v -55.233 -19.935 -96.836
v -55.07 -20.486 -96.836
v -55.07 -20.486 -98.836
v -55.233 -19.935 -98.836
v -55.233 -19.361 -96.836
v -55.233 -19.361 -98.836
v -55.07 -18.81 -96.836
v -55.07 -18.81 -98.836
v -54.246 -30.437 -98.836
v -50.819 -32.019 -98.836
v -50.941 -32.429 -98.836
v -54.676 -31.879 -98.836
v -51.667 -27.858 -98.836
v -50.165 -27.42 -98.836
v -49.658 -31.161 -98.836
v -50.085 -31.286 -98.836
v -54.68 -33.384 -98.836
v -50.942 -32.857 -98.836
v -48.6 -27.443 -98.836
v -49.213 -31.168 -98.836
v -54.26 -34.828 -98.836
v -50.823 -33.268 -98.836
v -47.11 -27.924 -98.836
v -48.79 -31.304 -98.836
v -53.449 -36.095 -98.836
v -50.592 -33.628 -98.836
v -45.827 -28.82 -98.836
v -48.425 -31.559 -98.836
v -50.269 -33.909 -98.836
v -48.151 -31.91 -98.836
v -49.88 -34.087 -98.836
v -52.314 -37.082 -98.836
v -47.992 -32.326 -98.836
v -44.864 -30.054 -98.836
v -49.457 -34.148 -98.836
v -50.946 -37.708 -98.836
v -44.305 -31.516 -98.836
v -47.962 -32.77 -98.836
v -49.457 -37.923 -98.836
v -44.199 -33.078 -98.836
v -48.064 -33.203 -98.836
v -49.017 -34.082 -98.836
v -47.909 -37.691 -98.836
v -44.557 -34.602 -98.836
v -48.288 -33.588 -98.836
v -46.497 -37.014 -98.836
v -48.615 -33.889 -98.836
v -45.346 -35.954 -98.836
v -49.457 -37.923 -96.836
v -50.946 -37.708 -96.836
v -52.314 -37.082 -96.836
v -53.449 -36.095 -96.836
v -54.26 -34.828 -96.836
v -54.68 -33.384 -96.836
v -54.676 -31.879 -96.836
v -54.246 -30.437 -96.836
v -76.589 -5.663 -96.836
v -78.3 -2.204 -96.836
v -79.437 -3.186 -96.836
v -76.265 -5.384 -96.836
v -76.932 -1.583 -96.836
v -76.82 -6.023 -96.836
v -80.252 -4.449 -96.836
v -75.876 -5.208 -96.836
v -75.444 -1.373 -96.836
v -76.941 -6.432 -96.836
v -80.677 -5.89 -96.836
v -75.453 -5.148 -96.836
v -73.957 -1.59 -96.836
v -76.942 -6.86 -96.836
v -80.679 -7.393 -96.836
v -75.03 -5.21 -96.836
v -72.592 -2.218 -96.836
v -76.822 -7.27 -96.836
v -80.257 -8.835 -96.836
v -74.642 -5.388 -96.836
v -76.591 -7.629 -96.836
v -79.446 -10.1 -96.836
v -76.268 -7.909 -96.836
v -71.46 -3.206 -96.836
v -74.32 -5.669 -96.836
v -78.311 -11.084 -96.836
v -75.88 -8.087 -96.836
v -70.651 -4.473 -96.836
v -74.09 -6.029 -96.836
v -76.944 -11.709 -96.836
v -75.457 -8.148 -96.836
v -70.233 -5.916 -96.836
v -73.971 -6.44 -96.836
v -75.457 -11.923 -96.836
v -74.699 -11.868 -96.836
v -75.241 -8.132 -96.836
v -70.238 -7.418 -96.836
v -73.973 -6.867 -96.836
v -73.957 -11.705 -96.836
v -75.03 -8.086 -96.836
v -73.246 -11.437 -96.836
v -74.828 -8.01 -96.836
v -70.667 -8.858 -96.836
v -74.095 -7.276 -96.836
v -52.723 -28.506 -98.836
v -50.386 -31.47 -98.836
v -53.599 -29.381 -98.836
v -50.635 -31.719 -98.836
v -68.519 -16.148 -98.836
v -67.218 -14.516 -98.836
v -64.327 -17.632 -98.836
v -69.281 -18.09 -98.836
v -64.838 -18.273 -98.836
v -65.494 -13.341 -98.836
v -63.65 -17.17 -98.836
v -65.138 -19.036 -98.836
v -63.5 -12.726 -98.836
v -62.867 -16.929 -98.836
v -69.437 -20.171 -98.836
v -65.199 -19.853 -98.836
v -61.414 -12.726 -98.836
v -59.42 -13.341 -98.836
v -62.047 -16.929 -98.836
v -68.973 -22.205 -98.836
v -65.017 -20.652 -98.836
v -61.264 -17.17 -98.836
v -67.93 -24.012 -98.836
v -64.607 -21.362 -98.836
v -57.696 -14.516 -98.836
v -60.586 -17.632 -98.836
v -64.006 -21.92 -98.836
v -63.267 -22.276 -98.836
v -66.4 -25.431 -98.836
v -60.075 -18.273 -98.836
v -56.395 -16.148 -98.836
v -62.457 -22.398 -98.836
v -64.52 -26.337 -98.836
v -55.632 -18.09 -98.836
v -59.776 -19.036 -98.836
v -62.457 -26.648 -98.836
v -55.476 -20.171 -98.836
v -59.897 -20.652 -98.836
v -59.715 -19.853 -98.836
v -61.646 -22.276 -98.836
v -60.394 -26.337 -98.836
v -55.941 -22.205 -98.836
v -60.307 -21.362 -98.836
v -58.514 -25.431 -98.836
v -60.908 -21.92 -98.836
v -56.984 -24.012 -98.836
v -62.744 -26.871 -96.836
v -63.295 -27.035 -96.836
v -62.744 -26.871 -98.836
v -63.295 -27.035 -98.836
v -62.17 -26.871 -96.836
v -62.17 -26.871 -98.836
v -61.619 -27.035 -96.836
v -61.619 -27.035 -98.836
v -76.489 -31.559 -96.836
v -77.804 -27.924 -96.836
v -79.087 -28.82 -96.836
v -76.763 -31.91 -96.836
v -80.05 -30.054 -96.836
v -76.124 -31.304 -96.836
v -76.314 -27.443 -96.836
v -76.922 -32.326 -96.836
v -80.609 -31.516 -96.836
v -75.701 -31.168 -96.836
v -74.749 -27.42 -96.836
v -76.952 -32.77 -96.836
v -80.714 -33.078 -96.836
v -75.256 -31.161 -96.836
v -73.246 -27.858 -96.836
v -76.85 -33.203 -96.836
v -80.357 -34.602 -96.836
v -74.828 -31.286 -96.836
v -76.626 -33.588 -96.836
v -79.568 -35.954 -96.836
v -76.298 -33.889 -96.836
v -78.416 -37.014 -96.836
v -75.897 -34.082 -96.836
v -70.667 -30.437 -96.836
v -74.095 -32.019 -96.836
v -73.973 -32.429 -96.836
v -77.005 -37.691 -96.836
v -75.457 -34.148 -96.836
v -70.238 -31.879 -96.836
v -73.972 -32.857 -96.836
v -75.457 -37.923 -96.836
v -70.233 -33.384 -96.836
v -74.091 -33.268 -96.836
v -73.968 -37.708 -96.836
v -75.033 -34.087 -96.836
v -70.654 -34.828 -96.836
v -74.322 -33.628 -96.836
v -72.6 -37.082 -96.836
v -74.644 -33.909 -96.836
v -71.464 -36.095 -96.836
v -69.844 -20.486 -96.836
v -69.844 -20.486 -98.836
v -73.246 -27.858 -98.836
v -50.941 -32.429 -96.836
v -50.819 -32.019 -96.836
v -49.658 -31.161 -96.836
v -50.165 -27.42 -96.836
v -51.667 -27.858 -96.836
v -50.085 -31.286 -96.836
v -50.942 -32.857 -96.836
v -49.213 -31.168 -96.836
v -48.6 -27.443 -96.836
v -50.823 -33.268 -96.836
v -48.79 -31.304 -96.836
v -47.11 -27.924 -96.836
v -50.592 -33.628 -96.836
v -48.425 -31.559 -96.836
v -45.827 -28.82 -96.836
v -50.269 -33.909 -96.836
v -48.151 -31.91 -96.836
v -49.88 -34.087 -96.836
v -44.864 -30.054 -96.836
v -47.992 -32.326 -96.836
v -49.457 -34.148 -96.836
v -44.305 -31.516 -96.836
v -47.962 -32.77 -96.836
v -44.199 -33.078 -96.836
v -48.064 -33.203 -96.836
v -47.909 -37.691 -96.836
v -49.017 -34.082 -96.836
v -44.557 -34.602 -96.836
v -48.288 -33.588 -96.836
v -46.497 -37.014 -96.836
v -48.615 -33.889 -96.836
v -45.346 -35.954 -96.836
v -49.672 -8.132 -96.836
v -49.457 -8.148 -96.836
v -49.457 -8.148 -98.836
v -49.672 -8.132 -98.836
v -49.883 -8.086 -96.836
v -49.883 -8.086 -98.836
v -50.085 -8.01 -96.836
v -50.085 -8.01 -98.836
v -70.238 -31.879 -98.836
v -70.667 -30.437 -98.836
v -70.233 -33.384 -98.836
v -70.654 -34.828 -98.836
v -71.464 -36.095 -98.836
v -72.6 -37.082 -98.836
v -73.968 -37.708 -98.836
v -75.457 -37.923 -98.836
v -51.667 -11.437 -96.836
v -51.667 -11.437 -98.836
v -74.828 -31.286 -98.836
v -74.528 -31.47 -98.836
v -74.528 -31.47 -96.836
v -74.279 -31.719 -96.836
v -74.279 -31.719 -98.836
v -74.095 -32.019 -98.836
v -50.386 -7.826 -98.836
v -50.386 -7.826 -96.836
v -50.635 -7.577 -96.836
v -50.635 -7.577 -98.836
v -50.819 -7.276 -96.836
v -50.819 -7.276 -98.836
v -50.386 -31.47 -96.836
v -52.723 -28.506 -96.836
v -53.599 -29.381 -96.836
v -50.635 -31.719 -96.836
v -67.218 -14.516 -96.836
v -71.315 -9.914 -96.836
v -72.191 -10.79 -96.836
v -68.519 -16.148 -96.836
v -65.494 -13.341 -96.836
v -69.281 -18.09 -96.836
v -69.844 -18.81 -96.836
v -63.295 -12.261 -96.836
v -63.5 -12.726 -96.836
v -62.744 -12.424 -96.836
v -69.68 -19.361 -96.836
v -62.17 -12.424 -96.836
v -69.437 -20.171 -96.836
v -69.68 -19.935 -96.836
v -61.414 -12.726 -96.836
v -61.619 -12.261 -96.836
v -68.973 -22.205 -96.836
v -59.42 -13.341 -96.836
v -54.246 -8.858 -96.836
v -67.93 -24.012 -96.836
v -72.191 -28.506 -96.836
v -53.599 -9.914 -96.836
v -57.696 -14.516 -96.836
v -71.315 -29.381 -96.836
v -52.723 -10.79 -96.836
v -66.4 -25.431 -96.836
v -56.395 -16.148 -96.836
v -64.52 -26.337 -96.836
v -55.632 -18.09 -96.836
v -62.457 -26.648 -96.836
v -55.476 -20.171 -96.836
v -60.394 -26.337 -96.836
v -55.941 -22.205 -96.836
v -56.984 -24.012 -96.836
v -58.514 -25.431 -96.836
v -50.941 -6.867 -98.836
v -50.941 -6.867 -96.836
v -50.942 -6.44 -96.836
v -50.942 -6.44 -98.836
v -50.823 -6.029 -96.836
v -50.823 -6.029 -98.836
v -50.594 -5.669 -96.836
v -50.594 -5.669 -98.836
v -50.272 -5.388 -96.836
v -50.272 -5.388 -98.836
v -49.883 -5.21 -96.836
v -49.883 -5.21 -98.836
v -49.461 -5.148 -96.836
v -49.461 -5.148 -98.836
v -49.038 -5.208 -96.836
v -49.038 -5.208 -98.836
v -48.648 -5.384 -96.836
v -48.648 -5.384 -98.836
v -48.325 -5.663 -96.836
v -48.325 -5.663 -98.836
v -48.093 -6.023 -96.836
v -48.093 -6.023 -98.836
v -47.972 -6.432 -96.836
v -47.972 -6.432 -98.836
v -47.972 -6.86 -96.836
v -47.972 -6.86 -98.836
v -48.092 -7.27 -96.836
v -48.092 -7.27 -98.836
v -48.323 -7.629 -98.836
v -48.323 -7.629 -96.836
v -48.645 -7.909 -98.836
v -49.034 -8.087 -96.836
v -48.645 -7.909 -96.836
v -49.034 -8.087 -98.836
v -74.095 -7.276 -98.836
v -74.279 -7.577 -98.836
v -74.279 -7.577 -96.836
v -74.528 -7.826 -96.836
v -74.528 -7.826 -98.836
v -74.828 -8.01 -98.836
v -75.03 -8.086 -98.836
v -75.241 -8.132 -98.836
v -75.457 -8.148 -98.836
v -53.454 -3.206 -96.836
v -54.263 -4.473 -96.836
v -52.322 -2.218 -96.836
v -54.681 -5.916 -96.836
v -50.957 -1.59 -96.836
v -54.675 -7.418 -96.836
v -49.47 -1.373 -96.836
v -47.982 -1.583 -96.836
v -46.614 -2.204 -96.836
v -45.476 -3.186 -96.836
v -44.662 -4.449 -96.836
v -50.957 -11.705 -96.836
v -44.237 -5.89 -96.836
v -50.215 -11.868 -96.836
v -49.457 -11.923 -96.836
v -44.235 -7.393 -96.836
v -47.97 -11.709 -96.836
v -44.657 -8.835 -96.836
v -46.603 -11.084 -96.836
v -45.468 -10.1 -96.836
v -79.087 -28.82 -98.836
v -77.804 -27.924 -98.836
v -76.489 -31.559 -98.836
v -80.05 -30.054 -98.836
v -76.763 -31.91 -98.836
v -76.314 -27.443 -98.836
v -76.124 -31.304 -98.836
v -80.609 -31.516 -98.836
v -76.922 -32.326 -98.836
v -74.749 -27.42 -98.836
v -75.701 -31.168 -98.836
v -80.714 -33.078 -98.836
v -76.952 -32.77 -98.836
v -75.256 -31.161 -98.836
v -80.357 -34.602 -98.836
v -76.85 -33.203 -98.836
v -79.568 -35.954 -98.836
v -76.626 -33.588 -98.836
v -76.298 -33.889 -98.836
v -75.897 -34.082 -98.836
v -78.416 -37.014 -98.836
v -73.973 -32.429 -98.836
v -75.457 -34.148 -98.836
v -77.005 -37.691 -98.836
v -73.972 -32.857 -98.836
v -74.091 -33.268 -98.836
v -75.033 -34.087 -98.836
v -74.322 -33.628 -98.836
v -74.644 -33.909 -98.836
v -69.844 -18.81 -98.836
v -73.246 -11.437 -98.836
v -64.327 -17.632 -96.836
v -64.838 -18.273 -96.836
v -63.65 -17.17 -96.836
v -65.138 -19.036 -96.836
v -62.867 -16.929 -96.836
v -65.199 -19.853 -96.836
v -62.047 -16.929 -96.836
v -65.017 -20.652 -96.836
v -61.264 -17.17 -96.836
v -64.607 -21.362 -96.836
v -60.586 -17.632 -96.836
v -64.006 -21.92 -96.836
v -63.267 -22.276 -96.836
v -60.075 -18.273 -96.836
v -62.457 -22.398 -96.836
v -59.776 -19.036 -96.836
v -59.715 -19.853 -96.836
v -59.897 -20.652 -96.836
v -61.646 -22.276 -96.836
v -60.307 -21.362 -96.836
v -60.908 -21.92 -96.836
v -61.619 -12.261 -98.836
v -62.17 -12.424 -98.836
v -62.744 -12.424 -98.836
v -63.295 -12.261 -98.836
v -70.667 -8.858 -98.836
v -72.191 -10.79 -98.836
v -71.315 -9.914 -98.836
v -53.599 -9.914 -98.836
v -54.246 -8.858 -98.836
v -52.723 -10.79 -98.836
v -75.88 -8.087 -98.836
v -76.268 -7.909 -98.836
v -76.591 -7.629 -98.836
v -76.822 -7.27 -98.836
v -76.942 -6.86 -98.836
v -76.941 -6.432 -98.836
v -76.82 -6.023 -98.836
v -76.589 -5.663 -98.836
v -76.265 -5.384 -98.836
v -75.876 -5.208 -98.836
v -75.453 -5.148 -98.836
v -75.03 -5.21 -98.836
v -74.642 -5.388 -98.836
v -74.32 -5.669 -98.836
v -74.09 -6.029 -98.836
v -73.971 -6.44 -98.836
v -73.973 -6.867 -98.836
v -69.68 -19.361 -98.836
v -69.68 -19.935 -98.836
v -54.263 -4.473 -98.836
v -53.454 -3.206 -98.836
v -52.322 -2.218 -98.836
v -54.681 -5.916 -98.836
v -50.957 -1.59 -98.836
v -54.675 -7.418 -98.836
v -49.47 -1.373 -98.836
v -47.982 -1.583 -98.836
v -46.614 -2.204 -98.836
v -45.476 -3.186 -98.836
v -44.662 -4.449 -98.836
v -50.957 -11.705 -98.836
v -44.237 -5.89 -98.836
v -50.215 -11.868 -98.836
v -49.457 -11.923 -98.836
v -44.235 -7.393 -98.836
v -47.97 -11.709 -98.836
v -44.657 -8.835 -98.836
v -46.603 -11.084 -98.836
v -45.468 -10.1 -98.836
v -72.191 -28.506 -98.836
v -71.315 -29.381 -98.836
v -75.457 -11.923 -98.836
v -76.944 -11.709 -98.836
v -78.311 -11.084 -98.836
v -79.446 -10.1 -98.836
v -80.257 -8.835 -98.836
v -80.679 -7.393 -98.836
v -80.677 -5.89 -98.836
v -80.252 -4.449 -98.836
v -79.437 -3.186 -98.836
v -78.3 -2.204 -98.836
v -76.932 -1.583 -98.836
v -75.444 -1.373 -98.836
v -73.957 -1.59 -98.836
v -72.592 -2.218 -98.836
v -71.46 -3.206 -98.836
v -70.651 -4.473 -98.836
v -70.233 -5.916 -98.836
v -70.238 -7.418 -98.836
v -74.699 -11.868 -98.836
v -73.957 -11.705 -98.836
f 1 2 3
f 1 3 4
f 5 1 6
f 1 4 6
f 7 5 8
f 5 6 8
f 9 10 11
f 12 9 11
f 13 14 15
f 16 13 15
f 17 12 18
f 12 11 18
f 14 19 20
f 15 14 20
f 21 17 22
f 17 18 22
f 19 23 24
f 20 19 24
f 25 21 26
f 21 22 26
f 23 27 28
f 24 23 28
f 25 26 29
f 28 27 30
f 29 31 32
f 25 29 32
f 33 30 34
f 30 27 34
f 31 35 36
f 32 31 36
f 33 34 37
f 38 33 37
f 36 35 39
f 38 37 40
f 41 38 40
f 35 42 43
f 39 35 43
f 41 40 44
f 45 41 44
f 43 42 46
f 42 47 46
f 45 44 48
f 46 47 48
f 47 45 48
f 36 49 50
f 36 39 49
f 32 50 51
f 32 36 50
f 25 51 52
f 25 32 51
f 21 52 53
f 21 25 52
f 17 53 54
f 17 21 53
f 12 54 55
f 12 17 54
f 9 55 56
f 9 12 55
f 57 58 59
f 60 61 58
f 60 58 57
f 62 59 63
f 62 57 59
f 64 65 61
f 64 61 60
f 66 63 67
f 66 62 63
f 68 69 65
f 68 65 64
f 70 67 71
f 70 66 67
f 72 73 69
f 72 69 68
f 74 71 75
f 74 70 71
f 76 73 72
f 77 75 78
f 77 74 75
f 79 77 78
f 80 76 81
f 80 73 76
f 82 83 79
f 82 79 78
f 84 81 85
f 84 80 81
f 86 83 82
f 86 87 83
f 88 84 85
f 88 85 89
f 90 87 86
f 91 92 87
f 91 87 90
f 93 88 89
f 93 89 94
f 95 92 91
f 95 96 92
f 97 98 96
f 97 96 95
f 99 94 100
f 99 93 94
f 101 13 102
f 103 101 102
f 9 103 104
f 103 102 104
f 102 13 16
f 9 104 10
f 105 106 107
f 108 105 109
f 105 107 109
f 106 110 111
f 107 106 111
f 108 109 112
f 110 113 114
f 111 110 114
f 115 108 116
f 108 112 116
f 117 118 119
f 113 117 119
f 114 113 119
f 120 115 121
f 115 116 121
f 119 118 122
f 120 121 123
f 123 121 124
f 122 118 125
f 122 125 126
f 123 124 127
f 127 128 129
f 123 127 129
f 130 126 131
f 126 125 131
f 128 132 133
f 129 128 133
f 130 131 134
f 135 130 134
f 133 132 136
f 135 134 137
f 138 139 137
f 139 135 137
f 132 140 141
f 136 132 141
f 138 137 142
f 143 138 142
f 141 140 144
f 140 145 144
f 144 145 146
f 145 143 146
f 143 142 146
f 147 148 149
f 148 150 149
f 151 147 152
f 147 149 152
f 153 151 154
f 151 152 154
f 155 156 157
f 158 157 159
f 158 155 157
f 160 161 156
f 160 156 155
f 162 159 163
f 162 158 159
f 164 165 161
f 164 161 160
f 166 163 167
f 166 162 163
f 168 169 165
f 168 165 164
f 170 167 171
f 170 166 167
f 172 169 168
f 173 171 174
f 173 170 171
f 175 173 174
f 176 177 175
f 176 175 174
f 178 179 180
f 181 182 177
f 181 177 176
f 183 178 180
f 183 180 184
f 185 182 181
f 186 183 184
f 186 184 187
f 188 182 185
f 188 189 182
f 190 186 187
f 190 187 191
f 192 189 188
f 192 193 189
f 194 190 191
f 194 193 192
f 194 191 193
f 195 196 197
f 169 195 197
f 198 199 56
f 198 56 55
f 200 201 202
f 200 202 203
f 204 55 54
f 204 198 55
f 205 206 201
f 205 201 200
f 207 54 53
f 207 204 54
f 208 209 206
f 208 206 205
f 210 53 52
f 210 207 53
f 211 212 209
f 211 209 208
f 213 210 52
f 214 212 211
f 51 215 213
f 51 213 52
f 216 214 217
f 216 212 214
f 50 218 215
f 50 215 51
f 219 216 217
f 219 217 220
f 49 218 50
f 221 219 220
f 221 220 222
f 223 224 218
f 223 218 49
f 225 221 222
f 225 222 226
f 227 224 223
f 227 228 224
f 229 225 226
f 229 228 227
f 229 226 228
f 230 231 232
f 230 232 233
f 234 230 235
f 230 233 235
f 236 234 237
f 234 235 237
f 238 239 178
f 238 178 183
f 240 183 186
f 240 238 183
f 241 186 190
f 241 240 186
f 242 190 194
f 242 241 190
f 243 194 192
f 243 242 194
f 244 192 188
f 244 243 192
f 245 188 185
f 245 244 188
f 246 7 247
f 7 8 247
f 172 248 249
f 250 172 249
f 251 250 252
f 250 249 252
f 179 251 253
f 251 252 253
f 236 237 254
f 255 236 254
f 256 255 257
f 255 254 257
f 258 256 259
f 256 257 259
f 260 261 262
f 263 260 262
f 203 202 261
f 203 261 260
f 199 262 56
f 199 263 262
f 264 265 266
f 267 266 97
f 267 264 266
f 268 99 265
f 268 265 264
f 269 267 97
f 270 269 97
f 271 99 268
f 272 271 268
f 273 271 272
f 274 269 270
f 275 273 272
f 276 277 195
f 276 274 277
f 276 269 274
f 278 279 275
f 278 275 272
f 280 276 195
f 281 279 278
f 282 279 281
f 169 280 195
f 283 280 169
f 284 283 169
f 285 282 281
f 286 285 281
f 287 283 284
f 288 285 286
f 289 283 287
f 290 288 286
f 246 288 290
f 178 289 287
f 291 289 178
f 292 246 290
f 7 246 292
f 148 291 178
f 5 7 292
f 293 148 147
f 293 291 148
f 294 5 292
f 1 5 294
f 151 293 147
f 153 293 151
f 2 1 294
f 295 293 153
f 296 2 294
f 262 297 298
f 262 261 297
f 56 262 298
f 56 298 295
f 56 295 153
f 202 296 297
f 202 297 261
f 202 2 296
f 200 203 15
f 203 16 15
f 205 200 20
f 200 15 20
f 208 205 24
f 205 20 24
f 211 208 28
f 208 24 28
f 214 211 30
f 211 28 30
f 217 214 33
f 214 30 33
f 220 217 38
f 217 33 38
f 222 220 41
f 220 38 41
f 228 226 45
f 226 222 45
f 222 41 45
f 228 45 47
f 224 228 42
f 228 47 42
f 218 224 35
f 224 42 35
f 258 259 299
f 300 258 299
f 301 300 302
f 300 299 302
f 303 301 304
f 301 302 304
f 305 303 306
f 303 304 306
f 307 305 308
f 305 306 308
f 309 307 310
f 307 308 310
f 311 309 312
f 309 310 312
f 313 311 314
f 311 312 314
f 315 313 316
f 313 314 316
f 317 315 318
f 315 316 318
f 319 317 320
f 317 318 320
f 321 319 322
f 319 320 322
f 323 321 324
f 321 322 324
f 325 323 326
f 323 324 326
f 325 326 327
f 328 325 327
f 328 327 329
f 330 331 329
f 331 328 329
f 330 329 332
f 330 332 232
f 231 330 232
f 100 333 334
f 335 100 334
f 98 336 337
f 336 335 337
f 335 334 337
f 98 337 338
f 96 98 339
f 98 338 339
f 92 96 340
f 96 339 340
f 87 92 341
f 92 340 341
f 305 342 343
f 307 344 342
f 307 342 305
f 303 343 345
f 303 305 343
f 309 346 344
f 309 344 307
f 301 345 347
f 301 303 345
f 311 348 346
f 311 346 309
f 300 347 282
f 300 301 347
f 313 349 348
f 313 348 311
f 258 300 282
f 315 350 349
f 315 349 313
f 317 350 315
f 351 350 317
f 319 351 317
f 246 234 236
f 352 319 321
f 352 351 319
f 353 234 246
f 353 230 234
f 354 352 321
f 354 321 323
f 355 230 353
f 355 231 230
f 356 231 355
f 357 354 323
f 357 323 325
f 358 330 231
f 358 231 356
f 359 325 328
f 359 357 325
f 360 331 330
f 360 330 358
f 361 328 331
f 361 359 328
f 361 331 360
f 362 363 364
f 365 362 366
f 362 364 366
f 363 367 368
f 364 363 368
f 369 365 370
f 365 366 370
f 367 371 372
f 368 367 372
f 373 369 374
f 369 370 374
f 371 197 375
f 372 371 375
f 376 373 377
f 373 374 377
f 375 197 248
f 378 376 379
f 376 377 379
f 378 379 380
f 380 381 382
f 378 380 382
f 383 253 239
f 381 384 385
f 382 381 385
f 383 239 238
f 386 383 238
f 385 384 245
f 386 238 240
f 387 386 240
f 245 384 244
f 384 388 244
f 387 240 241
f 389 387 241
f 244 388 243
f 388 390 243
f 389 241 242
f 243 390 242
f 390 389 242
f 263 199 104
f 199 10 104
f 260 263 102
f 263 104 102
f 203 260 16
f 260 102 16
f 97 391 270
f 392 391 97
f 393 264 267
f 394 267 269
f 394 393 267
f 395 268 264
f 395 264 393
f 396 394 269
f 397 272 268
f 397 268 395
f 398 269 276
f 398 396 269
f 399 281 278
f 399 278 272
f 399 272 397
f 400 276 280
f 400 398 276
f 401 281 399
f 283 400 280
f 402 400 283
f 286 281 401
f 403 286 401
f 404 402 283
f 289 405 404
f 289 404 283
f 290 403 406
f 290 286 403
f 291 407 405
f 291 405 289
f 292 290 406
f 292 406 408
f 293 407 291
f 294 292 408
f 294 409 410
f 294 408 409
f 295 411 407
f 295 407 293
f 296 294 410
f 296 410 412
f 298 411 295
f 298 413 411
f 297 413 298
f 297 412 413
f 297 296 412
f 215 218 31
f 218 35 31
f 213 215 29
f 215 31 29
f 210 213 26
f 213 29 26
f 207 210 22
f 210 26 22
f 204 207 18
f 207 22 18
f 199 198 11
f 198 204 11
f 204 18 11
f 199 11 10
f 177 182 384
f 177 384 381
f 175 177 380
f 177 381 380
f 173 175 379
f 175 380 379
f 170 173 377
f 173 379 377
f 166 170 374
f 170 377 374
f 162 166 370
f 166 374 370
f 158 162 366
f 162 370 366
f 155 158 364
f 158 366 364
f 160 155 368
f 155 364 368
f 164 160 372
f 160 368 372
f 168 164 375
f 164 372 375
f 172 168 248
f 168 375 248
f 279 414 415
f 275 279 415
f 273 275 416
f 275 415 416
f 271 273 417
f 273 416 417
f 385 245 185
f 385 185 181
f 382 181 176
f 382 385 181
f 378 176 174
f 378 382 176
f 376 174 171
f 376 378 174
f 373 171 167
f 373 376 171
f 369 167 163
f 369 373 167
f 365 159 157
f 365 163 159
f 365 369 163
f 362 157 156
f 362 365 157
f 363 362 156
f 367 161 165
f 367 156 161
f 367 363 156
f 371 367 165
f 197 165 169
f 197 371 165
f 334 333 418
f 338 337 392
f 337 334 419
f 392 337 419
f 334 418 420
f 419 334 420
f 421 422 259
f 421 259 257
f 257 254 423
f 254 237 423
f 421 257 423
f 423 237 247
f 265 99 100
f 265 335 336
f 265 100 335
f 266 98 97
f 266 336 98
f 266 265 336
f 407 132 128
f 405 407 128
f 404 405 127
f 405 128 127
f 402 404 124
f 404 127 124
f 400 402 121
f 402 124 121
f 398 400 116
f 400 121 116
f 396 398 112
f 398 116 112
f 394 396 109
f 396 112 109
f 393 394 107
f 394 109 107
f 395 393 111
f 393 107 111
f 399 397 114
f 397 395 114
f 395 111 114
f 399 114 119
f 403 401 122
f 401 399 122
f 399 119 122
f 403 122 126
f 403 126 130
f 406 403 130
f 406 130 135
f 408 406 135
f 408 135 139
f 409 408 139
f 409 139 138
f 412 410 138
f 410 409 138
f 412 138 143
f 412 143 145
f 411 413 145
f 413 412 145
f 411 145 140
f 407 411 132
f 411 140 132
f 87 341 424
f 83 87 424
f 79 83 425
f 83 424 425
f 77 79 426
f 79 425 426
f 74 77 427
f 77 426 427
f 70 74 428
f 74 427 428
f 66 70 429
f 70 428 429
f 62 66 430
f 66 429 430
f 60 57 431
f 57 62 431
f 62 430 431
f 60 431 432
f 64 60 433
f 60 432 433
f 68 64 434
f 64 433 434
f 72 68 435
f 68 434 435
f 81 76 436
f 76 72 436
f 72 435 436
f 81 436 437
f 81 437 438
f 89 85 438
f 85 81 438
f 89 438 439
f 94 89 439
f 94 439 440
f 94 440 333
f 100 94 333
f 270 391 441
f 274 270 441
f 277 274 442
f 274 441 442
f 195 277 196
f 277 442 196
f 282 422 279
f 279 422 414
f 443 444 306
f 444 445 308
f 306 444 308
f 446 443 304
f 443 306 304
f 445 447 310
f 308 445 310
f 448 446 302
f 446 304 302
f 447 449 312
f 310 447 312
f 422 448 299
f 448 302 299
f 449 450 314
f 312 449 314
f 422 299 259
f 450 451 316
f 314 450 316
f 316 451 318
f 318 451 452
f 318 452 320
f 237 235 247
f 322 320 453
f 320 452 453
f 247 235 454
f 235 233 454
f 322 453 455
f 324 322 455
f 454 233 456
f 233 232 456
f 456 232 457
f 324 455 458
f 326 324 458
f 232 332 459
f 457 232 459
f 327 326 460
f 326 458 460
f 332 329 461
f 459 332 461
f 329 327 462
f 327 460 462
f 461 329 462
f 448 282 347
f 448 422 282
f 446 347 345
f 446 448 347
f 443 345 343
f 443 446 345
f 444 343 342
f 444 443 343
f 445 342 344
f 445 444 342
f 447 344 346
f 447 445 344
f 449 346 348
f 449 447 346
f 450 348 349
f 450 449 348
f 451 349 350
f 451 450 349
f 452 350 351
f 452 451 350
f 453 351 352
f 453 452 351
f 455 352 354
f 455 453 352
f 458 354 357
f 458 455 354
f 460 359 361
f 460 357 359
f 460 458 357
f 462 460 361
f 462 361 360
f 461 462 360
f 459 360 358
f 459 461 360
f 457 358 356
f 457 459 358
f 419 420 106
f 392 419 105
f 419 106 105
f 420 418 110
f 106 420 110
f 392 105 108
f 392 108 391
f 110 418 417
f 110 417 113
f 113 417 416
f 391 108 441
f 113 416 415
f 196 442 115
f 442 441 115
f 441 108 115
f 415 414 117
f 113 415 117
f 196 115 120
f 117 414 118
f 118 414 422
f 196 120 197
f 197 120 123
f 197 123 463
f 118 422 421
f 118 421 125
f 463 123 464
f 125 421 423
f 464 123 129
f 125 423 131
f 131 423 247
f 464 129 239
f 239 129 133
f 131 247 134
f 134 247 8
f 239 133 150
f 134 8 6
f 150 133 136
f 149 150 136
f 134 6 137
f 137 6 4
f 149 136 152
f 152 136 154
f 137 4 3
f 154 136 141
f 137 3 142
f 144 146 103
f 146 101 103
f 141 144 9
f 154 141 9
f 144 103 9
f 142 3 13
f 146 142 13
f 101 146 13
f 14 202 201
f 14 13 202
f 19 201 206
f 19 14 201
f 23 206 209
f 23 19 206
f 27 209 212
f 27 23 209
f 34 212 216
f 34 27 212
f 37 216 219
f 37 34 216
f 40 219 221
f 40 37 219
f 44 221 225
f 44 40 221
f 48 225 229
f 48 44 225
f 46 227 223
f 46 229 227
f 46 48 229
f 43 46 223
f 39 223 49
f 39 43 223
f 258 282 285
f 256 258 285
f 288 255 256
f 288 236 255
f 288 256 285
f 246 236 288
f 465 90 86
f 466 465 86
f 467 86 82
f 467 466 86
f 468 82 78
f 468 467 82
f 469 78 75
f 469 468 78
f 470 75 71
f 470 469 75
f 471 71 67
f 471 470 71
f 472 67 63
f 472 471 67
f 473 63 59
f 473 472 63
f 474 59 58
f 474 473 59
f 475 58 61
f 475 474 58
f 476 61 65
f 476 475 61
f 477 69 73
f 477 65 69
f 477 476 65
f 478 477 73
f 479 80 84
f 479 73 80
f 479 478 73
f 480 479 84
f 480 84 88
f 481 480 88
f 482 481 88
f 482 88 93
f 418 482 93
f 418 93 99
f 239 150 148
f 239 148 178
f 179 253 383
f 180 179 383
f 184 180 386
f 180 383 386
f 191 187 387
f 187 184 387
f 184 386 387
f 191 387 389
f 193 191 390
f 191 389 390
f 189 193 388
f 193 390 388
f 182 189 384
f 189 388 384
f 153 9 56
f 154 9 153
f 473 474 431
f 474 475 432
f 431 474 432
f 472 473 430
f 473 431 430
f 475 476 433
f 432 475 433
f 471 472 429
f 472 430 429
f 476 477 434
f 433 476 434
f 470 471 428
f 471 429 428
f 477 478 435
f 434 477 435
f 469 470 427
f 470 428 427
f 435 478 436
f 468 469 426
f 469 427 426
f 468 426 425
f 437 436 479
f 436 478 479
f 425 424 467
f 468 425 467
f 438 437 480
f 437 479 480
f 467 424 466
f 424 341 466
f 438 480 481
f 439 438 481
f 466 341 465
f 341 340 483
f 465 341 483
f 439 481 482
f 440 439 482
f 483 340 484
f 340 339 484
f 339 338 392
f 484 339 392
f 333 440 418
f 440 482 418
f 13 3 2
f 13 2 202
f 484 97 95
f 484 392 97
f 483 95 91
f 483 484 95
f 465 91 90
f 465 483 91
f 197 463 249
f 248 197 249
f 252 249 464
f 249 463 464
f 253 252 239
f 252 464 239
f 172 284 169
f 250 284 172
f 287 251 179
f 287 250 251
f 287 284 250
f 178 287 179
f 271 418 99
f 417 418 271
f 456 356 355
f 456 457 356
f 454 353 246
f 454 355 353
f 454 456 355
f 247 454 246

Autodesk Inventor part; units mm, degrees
ref_plane "YZ Plane" through (0, 0, 0) normal (1, 0, 0) x (0, 1, 0)
ref_plane "XZ Plane" through (0, 0, 0) normal (0, 1, 0) x (-1, 0, 0)
ref_plane "XY Plane" through (0, 0, 0) normal (0, 0, 1) x (1, 0, 0)
ref_plane "РабПлоскость1" through (-194.4569, -1.6478, -98.8355) normal (0, 0, 1) x (0, -1, 0)
sketch "Эскиз1" plane through (-194.4569, -1.6478, -98.8355) normal (0, 0, 1) x (0, -1, 0)
  circle A0 centre (5, 145) radius 1.5 projected
  circle A1 centre (5, 119) radius 1.5 projected
  circle A2 centre (18, 132) radius 7 projected
  circle A3 centre (31, 119) radius 1.5 projected
  circle A4 centre (31, 145) radius 1.5 projected
  line L0 (18.8381, 124.6132) -> (31, 119)
  line L1 (17.1619, 124.6132) -> (5, 119)
  line L2 (5, 119) -> (10.6132, 131.1619)
  line L3 (5, 145) -> (10.6132, 132.8381)
  line L4 (17.1619, 139.3868) -> (5, 145)
  line L5 (18.8381, 139.3868) -> (31, 145)
  line L6 (31, 145) -> (25.3868, 132.8381)
  line L7 (25.3868, 131.1619) -> (31, 119)
  circle A5 centre (5, 119) radius 5.275
  circle A6 centre (5, 145) radius 5.275
  circle A7 centre (31, 145) radius 5.275
  circle A8 centre (31, 119) radius 5.275
  arc A9 (18.8381, 124.6132) -> (17.1619, 124.6132) centre (18, 122.7973) ccw
  arc A10 (25.3868, 132.8381) -> (25.3868, 131.1619) centre (27.2027, 132) ccw
  arc A11 (17.1619, 139.3868) -> (18.8381, 139.3868) centre (18, 141.2027) ccw
  arc A12 (10.6132, 131.1619) -> (10.6132, 132.8381) centre (8.7973, 132) ccw
  circle A13 centre (18, 132) radius 2.75
  point P0 (-1.6478, 194.4569)
  point P1 (18, 125)
  point P2 (11, 132)
  point P3 (18, 139)
  point P4 (25, 132)
  point P5 (9.7895, 121.2105)
  point P6 (26.2105, 121.2105)
  point P7 (28.7895, 123.7895)
  point P8 (28.7895, 140.2105)
  point P9 (26.2105, 142.7895)
  point P10 (9.7895, 142.7895)
  point P11 (7.2105, 140.2105)
  point P12 (7.2105, 123.7895)
  point P13 (6.3619, 119.6286)
  point P14 (5.6286, 120.3619)
  point P15 (5.6286, 143.6381)
  point P16 (6.3619, 144.3714)
  point P17 (29.6381, 144.3714)
  point P18 (30.3714, 143.6381)
  point P19 (30.3714, 120.3619)
  point P20 (29.6381, 119.6286)
  dimension "d0" = 2
  dimension "d1" = 5.5
extrude "Выдавливание1" add sketch "Эскиз1" along normal blind 2 contours A0 L3 A6 L4 | A0 L4 A6 L3 | A6 L4 A11 L5 A7 L6 A10 L7 A8 L0 A9 L1 A5 L2 A12 L3 | A5 L1 A1 L2 | L2 A1 L1 A5 | A7 L6 A4 L5 | L5 A4 L6 A7 | A8 L7 A3 L0 | L0 A3 L7 A8 | A2
properties part number "крепеж подшипника"
